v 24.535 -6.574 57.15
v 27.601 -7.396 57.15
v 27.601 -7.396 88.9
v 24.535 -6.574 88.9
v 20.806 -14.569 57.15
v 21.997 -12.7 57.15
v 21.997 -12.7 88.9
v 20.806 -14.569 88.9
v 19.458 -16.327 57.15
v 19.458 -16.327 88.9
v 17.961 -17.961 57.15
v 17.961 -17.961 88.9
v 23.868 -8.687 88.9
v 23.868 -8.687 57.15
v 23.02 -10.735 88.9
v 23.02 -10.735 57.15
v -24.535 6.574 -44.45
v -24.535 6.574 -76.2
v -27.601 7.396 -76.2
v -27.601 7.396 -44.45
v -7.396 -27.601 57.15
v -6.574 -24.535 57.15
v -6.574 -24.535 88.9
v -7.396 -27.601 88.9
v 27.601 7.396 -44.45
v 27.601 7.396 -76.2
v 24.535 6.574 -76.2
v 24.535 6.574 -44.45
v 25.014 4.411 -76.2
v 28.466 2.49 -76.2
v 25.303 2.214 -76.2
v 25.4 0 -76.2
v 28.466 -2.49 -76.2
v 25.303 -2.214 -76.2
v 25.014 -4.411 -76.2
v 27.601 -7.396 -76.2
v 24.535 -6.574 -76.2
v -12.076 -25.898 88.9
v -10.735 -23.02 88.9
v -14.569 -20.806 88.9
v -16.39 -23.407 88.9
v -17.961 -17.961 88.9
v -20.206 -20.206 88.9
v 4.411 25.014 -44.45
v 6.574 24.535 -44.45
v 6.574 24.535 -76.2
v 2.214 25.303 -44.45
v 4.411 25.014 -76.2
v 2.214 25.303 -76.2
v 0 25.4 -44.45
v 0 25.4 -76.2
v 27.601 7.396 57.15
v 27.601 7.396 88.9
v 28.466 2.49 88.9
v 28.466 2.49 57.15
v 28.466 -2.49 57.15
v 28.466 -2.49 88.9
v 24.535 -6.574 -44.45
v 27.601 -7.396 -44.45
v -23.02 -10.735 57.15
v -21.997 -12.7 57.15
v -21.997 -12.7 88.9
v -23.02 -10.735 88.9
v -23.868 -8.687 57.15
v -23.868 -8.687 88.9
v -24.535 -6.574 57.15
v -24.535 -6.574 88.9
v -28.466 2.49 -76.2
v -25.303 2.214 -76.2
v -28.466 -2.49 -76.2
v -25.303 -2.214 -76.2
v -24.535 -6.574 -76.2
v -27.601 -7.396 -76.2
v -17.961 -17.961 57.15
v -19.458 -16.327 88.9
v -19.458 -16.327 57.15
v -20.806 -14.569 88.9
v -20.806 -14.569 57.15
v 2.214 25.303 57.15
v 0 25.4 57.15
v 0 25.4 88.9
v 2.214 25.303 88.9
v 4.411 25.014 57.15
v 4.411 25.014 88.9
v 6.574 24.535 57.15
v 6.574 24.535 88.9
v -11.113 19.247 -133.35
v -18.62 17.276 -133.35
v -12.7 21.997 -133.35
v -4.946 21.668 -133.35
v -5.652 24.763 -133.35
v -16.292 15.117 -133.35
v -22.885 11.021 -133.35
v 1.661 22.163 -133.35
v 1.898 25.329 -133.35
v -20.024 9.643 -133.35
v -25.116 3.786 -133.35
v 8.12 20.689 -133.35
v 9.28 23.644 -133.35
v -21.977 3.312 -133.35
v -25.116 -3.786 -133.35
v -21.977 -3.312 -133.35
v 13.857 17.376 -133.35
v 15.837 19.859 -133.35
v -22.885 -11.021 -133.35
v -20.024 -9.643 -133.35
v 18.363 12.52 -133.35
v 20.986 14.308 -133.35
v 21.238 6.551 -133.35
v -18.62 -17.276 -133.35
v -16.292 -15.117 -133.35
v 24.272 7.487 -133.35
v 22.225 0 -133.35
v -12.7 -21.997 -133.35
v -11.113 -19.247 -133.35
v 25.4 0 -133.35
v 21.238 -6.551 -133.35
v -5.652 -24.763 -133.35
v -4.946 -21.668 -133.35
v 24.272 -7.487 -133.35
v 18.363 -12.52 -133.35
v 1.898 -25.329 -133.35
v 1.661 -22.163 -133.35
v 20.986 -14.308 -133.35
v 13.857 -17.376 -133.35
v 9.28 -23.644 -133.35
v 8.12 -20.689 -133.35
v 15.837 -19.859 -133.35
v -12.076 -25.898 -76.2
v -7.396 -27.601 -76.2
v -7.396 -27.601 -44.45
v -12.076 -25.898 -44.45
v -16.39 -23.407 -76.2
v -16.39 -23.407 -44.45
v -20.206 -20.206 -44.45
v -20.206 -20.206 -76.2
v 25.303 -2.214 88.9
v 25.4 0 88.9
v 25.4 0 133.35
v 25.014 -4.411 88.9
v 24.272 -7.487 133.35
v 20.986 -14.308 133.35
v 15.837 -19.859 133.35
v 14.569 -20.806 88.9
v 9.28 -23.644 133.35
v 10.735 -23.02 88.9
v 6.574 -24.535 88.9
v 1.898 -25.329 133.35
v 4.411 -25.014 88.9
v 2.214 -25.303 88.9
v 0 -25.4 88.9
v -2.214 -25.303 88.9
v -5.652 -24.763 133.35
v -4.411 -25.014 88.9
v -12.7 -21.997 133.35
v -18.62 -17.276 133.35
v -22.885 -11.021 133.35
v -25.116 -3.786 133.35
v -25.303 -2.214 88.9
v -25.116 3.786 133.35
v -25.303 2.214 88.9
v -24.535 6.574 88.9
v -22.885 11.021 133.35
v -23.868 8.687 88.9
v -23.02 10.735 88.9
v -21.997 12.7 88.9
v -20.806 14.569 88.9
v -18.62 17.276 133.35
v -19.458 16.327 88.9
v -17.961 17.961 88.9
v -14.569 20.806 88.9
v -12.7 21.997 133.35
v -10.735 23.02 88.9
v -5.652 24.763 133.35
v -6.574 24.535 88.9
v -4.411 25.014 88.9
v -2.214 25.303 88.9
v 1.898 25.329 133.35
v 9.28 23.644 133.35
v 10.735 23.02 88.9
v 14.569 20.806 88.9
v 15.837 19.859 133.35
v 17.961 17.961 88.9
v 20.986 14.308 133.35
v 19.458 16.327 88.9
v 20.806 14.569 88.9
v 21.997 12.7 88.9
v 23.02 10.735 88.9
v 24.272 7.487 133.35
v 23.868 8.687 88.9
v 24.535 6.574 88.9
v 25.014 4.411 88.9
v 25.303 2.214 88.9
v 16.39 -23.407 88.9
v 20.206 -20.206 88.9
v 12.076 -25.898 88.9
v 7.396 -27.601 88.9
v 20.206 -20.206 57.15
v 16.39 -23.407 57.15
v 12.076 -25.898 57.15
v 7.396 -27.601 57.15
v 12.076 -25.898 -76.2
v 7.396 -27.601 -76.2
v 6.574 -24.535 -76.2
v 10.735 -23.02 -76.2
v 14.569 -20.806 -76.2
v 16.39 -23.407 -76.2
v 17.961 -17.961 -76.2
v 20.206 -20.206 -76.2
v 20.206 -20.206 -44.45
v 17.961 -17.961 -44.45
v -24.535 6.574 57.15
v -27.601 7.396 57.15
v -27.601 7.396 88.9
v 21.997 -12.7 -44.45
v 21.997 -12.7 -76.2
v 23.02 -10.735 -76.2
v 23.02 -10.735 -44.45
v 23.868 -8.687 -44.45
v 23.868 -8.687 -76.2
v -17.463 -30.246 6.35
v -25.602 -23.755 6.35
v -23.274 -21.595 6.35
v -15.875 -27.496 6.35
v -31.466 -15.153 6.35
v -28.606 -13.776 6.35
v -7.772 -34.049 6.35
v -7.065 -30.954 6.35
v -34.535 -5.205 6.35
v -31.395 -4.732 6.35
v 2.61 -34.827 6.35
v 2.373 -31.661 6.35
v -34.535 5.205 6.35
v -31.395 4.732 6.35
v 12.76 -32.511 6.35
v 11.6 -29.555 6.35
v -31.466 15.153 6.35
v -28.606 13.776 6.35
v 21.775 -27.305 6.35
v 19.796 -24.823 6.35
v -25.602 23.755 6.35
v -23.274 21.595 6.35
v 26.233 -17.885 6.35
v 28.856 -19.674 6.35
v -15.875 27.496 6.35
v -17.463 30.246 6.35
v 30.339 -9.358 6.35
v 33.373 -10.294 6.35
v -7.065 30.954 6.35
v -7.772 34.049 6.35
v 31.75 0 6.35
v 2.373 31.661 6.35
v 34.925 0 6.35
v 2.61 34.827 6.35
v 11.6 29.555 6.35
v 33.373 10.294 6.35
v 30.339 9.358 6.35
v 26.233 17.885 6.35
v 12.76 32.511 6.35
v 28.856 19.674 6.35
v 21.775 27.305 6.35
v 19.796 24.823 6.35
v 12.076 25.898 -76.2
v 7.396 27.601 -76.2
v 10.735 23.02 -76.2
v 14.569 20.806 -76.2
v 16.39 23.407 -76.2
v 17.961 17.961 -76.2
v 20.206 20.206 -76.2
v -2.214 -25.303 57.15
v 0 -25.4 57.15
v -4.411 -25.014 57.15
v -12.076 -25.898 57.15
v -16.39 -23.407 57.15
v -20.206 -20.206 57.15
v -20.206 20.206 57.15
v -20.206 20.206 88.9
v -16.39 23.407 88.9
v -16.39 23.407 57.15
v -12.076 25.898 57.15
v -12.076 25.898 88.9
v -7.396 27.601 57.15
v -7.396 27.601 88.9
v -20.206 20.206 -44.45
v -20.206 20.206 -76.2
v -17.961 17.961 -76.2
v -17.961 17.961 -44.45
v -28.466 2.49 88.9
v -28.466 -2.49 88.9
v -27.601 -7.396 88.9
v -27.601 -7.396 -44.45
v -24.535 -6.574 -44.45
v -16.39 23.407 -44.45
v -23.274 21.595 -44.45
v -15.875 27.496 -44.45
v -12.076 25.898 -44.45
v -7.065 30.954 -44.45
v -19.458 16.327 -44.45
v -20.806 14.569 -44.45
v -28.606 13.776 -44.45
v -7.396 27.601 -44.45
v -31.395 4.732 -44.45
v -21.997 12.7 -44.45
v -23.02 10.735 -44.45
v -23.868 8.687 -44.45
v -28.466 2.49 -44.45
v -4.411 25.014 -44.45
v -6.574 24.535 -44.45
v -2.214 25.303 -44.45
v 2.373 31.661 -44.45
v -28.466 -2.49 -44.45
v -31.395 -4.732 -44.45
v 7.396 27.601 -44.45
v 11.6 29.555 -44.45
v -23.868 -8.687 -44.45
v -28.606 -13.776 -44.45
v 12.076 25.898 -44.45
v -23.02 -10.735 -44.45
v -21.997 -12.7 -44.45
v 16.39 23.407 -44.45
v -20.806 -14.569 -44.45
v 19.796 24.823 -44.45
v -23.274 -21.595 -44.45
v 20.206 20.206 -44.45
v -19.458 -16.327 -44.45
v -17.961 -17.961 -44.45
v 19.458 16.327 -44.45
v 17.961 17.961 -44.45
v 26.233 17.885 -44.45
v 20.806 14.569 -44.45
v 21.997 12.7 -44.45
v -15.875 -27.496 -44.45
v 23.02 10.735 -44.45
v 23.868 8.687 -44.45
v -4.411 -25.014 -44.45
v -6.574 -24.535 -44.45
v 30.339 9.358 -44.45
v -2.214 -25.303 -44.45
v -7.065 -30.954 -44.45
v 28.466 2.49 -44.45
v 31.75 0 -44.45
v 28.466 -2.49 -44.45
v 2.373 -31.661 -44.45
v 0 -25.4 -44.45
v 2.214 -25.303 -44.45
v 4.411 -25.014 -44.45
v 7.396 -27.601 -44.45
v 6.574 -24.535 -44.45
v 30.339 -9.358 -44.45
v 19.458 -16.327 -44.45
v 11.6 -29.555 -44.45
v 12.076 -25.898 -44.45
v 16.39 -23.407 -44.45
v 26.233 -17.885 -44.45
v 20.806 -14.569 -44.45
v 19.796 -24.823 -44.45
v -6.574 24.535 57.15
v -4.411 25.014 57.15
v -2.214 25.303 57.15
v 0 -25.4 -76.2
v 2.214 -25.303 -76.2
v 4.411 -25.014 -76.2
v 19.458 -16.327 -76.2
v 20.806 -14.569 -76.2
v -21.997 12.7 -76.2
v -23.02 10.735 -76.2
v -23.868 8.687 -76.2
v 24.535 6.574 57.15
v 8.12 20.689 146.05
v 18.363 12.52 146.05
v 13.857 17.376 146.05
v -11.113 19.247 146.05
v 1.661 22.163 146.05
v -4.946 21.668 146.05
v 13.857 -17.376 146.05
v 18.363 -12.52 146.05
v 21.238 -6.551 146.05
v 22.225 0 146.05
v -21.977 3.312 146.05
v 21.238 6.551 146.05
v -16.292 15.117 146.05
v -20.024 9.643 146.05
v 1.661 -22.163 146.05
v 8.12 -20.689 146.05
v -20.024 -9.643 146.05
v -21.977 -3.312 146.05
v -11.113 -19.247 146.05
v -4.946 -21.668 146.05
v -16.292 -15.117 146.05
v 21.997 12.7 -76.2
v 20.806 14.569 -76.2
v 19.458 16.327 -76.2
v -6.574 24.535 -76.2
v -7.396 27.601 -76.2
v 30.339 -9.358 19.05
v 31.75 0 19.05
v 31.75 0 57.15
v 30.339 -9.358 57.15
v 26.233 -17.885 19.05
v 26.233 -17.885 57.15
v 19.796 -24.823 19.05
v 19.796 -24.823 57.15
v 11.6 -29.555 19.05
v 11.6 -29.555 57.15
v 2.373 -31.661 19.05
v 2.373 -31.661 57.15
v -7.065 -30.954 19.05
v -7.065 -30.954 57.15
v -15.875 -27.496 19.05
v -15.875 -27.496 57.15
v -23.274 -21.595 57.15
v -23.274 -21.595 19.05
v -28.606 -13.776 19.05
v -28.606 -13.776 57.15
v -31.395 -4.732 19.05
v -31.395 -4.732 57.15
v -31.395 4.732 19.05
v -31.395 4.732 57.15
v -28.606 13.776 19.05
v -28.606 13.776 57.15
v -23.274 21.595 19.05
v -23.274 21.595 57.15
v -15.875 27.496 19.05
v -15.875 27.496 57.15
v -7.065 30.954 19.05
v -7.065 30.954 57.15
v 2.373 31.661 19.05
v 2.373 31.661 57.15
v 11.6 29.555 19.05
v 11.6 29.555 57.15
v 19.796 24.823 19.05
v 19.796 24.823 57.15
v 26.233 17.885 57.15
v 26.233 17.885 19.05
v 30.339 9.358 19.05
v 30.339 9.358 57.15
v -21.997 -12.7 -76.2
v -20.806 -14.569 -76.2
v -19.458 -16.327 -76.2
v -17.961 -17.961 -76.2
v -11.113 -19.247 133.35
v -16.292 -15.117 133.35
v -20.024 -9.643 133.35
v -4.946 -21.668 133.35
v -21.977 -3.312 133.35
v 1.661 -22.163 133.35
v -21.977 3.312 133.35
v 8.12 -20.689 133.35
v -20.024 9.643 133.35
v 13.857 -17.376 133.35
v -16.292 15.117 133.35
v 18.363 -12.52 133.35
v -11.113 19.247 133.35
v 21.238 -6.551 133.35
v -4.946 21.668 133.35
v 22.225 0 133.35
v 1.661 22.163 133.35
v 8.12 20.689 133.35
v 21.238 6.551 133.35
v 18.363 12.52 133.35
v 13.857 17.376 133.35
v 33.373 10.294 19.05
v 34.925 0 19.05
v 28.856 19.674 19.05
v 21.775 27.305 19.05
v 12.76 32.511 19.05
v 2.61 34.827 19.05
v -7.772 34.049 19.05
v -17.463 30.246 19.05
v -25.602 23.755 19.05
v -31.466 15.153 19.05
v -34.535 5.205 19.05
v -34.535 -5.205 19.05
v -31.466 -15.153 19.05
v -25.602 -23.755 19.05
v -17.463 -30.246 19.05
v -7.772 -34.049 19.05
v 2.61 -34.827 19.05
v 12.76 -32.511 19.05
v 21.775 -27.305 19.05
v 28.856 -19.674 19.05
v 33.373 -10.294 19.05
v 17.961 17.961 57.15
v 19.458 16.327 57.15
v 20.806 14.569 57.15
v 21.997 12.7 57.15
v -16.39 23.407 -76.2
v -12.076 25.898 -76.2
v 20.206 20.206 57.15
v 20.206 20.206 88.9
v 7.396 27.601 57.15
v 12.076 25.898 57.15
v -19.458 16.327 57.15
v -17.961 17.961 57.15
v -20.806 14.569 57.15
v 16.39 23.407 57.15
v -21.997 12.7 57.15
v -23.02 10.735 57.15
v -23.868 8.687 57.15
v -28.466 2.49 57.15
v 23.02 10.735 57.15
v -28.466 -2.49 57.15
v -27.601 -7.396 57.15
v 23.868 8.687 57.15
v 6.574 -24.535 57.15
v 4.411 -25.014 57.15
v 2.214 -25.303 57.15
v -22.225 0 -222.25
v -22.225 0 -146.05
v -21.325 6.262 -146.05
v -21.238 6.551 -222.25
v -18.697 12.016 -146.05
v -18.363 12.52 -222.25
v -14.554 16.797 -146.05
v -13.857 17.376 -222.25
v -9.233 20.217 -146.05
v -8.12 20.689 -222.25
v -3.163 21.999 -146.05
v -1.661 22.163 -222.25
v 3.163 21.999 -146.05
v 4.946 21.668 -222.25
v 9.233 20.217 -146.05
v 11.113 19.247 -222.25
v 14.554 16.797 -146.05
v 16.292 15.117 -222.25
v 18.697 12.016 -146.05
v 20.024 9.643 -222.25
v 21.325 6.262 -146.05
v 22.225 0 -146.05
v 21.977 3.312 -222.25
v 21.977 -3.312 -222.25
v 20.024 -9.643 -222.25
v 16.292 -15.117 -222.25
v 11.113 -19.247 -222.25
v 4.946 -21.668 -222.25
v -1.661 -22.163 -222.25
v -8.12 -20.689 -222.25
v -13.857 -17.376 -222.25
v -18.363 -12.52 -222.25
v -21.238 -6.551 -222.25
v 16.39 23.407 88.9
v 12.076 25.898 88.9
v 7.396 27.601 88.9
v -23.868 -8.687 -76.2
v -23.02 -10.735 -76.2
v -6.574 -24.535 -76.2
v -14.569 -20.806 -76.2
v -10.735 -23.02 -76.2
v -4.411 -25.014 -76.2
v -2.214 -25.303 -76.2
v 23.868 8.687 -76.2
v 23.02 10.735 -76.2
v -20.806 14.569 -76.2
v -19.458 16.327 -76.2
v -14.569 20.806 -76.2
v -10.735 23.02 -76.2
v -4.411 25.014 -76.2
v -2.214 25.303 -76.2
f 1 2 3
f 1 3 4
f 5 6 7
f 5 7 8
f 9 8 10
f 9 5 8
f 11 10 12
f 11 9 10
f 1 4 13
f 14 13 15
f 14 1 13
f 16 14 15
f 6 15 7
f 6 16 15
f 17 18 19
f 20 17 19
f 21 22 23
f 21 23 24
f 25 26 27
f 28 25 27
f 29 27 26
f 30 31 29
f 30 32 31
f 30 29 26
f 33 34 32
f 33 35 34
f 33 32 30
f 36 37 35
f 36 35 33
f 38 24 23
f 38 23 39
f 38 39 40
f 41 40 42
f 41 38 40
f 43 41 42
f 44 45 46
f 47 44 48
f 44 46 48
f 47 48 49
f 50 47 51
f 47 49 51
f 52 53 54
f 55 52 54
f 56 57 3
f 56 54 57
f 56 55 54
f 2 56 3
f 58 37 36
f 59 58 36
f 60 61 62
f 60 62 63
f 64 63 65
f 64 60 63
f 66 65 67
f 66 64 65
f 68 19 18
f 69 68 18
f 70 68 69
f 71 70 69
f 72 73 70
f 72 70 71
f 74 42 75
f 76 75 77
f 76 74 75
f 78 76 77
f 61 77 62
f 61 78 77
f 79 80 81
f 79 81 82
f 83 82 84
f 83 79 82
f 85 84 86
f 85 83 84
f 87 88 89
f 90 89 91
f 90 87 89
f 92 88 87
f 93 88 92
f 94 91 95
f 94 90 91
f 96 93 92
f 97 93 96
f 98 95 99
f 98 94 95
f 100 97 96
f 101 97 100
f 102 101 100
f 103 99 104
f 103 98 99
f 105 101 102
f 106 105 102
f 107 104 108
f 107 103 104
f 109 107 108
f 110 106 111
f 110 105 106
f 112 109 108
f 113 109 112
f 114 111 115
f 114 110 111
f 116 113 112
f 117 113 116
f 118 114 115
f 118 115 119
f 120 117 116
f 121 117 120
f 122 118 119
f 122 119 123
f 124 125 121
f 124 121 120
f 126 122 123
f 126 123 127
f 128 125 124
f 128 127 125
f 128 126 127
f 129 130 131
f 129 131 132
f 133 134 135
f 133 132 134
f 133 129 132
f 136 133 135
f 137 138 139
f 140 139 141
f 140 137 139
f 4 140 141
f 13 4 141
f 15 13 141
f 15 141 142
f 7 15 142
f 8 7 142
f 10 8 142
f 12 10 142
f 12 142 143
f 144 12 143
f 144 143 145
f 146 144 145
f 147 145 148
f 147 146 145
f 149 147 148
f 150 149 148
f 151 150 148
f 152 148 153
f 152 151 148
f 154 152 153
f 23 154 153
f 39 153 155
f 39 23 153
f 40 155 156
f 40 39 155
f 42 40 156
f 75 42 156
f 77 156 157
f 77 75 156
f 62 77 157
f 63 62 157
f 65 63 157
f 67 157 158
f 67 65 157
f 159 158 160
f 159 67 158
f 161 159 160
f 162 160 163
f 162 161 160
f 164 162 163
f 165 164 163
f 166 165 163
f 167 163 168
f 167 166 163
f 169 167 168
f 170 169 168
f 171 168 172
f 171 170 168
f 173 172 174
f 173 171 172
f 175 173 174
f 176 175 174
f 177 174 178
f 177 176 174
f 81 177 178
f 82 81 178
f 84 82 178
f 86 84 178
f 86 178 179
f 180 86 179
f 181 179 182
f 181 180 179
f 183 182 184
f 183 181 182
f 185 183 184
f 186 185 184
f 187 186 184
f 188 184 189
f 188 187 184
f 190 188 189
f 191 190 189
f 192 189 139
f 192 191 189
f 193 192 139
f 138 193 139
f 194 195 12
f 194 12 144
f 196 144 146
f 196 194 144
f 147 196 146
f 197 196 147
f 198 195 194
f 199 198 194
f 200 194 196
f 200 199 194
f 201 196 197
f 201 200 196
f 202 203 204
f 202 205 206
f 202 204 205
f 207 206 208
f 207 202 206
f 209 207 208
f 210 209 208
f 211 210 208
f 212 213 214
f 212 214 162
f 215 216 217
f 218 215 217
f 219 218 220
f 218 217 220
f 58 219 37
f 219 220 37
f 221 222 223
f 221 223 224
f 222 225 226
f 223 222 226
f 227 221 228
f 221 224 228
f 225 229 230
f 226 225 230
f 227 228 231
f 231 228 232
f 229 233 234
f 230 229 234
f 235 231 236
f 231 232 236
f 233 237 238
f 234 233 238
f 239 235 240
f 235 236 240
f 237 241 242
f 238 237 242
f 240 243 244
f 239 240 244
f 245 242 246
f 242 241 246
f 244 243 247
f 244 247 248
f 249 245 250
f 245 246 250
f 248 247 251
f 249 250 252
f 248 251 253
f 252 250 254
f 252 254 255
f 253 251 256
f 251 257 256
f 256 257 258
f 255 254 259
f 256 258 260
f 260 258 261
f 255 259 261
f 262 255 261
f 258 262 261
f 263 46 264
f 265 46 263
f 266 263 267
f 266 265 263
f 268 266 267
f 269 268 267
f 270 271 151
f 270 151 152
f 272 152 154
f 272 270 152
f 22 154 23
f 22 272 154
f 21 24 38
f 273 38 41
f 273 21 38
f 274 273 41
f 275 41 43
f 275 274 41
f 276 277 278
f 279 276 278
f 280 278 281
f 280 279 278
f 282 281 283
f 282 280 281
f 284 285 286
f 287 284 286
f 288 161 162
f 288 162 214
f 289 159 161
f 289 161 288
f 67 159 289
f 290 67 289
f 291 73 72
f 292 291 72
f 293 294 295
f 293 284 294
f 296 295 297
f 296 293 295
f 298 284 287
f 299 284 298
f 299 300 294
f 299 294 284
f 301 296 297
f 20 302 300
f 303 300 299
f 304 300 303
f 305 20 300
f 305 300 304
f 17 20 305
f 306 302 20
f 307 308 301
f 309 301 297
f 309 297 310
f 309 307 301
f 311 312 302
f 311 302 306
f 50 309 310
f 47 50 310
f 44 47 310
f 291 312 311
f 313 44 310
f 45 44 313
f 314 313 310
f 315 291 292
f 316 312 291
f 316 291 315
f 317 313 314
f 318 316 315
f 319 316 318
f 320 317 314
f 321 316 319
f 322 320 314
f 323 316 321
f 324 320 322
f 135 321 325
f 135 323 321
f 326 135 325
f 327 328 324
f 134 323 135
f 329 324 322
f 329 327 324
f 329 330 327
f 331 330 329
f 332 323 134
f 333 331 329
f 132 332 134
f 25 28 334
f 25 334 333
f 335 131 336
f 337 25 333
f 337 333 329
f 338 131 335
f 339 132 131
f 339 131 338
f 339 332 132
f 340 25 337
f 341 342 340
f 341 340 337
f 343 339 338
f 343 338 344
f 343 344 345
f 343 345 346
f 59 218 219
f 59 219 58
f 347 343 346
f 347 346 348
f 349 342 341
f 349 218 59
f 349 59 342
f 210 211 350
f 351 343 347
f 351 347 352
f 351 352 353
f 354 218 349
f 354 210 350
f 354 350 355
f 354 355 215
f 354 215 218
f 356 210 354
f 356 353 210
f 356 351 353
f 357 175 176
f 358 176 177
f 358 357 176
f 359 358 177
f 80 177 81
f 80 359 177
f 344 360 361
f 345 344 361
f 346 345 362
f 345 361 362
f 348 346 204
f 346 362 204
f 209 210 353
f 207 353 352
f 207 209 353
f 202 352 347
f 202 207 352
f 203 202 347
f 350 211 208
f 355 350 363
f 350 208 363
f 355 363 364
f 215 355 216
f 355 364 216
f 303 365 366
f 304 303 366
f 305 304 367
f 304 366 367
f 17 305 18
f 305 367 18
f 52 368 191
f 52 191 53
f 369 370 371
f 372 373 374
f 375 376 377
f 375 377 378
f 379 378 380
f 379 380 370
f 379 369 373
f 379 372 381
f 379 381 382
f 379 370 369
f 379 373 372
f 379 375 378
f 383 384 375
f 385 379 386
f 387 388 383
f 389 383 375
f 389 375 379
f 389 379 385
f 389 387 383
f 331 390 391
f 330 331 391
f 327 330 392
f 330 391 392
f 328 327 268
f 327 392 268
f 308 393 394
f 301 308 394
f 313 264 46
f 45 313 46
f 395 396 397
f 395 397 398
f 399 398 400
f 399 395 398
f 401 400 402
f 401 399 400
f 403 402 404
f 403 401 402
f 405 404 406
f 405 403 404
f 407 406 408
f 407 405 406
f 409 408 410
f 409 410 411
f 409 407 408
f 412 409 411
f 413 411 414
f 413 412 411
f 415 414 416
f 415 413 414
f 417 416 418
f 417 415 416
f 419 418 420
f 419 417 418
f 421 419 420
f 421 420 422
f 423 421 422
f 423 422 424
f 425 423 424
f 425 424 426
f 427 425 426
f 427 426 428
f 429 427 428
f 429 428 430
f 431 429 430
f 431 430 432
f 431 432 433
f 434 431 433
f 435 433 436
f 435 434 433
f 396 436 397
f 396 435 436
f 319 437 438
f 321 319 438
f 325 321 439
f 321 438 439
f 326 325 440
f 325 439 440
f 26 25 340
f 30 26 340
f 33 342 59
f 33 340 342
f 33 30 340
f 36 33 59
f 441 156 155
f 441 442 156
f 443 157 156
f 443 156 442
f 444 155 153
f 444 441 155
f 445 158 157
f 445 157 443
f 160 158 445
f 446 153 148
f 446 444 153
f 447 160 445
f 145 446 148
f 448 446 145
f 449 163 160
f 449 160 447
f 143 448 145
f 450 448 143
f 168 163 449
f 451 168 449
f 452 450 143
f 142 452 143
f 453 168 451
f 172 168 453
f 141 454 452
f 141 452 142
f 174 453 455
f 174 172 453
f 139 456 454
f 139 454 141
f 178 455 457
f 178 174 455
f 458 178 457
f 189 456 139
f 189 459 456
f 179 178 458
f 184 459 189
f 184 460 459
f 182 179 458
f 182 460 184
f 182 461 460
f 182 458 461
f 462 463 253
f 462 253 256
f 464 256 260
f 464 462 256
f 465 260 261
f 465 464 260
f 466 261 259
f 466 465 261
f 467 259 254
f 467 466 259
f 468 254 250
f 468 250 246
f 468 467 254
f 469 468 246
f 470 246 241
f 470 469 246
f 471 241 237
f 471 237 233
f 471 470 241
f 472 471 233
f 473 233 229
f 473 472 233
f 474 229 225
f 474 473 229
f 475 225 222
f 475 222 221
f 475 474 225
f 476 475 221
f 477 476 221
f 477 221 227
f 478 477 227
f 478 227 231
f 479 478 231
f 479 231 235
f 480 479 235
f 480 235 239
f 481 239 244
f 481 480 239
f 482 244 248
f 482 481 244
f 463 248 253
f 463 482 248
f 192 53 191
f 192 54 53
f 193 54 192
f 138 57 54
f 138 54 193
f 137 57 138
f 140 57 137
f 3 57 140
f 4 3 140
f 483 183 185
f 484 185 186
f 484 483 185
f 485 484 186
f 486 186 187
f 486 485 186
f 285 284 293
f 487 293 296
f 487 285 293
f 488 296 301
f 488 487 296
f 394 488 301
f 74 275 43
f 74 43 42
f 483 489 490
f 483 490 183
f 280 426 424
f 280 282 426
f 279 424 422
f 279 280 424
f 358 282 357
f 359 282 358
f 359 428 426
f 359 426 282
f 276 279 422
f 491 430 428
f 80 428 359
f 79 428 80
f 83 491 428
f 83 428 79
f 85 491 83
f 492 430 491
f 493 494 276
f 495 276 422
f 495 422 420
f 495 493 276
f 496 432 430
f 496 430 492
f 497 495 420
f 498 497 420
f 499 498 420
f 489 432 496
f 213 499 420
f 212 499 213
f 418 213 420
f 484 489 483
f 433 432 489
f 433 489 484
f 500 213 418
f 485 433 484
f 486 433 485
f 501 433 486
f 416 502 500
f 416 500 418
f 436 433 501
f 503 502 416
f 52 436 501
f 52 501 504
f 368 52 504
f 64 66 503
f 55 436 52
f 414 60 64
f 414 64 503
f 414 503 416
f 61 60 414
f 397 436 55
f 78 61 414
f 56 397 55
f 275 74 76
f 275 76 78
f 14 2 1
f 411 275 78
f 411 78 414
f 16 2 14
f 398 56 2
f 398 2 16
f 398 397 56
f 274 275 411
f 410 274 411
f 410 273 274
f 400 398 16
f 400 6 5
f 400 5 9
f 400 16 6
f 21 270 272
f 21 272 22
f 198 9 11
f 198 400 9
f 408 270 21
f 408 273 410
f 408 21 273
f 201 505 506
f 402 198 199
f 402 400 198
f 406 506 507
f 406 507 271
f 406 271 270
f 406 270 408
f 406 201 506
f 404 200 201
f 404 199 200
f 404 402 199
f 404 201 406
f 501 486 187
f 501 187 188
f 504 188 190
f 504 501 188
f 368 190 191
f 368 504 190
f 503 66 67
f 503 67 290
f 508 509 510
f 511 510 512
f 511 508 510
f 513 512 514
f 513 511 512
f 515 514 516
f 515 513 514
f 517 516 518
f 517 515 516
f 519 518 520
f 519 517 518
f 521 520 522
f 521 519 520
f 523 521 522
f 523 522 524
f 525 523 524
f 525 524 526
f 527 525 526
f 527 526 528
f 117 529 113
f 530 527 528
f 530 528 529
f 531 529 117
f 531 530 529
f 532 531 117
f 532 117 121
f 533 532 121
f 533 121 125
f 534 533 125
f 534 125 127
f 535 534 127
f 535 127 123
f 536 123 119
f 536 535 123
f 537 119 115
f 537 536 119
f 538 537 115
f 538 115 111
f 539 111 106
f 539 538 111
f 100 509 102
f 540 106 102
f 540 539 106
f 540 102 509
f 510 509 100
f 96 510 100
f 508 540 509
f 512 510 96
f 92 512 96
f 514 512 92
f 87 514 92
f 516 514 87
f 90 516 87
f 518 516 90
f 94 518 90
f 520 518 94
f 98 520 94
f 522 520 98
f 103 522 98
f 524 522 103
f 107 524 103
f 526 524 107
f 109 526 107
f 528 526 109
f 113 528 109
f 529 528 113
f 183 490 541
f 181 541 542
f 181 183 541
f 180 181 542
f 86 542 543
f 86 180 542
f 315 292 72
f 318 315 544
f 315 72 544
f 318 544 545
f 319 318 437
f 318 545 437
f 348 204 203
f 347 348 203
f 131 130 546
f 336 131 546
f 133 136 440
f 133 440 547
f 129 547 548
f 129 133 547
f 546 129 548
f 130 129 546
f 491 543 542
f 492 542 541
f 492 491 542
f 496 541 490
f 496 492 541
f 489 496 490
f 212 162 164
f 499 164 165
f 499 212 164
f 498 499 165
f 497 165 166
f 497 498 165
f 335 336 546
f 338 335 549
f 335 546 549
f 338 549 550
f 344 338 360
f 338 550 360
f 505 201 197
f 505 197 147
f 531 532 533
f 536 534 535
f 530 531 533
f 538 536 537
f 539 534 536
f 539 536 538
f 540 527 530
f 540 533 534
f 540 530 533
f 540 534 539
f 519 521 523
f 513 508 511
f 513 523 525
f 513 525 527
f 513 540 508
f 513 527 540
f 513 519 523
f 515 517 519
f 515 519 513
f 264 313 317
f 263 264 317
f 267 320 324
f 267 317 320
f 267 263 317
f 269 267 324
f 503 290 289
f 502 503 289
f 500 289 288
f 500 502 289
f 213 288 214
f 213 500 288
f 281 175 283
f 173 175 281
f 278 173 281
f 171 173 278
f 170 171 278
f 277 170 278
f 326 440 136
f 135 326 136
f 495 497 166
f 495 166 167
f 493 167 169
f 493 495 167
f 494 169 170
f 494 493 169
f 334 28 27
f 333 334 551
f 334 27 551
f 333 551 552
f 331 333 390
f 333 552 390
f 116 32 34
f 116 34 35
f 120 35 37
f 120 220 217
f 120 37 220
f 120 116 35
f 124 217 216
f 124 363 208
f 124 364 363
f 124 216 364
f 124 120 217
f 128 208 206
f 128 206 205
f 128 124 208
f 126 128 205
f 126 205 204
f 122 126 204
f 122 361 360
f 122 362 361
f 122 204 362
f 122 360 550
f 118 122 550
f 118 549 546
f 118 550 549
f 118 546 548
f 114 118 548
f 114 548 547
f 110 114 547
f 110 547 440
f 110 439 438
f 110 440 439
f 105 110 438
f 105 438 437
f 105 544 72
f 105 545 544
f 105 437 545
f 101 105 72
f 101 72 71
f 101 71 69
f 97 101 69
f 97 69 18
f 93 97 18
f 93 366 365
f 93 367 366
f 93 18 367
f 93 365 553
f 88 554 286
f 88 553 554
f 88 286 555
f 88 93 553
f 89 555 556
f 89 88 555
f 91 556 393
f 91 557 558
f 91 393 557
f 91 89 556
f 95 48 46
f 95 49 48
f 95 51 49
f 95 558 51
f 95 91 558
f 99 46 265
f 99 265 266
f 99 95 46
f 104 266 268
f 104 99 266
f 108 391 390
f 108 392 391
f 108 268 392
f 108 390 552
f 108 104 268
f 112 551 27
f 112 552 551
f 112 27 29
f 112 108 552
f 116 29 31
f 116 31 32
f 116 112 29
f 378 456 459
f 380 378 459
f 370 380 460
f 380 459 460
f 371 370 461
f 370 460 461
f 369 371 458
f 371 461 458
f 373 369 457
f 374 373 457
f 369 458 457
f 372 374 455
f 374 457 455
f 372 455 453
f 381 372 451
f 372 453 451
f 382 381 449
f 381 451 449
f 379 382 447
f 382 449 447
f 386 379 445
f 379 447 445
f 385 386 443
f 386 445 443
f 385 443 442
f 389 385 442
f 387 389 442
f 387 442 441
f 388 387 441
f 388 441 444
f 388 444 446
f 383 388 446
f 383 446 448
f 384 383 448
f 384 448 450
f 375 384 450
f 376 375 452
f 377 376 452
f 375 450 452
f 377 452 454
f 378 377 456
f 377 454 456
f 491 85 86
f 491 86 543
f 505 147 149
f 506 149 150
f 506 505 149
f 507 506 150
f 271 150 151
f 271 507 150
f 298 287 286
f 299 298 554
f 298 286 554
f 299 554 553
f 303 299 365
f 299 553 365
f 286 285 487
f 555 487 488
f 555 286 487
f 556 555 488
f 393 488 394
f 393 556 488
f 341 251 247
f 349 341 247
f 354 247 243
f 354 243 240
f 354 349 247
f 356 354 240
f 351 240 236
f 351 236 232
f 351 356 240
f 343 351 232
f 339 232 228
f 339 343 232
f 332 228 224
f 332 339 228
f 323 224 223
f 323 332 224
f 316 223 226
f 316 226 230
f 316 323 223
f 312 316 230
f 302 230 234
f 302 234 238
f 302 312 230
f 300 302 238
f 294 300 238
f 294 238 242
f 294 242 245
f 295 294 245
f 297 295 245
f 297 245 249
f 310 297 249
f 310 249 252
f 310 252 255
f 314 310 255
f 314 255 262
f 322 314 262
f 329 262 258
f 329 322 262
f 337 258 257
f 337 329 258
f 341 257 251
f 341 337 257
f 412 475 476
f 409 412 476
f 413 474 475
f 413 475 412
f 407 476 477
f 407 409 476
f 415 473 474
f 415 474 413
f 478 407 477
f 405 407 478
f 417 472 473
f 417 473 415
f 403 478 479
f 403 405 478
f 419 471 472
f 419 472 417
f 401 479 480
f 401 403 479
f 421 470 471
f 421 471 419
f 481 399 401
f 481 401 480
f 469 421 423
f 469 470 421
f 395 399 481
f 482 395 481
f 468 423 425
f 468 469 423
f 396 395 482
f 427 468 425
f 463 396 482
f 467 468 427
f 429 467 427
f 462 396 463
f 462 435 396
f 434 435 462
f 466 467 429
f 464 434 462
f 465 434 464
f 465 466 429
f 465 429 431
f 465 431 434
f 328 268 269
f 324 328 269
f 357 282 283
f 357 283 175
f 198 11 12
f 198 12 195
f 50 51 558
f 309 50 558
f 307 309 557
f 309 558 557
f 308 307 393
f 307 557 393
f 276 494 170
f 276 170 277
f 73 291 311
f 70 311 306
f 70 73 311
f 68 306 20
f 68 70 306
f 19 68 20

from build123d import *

# Parameters (mm, degrees)
CUT_EXTRUDE2_START  = -31.75
CUT_EXTRUDE2_DEPTH  = 31.75
CIRPATTERN1_COUNT   = 6
CUT_EXTRUDE3_DEPTH  = 31.75
CIRPATTERN2_COUNT   = 6
CUT_EXTRUDE4_START  = -12.7
SKETCH7_R           = 25.4
SKETCH7_R_2         = 22.225
CUT_EXTRUDE4_DEPTH  = 12.7
SKETCH8_R           = 25.4
SKETCH8_R_2         = 22.225
CUT_EXTRUDE5_DEPTH  = 12.7
BOSS_EXTRUDE1_START = -38.1
SKETCH9_R           = 34.925
BOSS_EXTRUDE1_DEPTH = 12.7
BOSS_EXTRUDE2_START = 76.2
SKETCH10_R          = 22.225
BOSS_EXTRUDE2_DEPTH = 76.2


with BuildPart() as part:
    # Sketch3 → Revolve1 (revolve)
    with BuildSketch(Plane(origin=(0, 0, 0), x_dir=(0, 0, -1), z_dir=(1, 0, 0)), mode=Mode.PRIVATE) as revolve1_sk:
        Polygon((-146.05, 0), (-146.05, 25.4), (-88.9, 25.4), (-88.9, 28.575), (-57.15, 28.575), (-57.15, 31.75), (44.45, 31.75), (44.45, 28.575), (76.2, 28.575), (76.2, 25.4), (146.05, 25.4), (146.05, 0), align=None)
    revolve(revolve1_sk.sketch.rotate(Axis((0, 0, 128.279136691), (0, 0, -1)), 90), axis=Axis((0, 0, 128.279136691), (0, 0, -1)))

    # Sketch5 → Cut-Extrude2 (cut)
    with BuildSketch(Plane.XY.offset(88.9).offset(CUT_EXTRUDE2_START)):
        with BuildLine():
            Line((0, 28.575), (0, 25.4))
            ThreePointArc((0, 25.4), (3.315365282, 25.182699479), (6.574003746, 24.534515988))
            Line((6.574003746, 24.534515988), (7.395754214, 27.601330486))
            ThreePointArc((7.395754214, 27.601330486), (3.729785943, 28.330536914), (0, 28.575))
        make_face()
        with BuildLine():
            ThreePointArc((-6.574003746, 24.534515988), (-3.315365282, 25.182699479), (0, 25.4))
            Line((0, 25.4), (0, 28.575))
            ThreePointArc((0, 28.575), (-3.729785943, 28.330536914), (-7.395754214, 27.601330486))
            Line((-7.395754214, 27.601330486), (-6.574003746, 24.534515988))
        make_face()
    cut_extrude2 = extrude(amount=CUT_EXTRUDE2_DEPTH, mode=Mode.SUBTRACT)

    # CirPattern1: Cut-Extrude2 ×6 about axis
    cirpattern1_axis = Axis((0, 0, 0), (0, 0, 1))
    for i in range(1, CIRPATTERN1_COUNT):
        add(cut_extrude2.rotate(cirpattern1_axis, i * 360 / CIRPATTERN1_COUNT), mode=Mode.SUBTRACT)

    # Sketch6 → Cut-Extrude3 (cut)
    with BuildSketch(Plane(origin=(0, 0, -76.2), x_dir=(-1, 0, 0), z_dir=(0, 0, -1))):
        with BuildLine():
            Line((0, 28.575), (0, 25.4))
            ThreePointArc((0, 25.4), (3.315365282, 25.182699479), (6.574003746, 24.534515988))
            Line((6.574003746, 24.534515988), (7.395754214, 27.601330486))
            ThreePointArc((7.395754214, 27.601330486), (3.729785943, 28.330536914), (0, 28.575))
        make_face()
        with BuildLine():
            ThreePointArc((-6.574003746, 24.534515988), (-3.315365282, 25.182699479), (0, 25.4))
            Line((0, 25.4), (0, 28.575))
            ThreePointArc((0, 28.575), (-3.729785943, 28.330536914), (-7.395754214, 27.601330486))
            Line((-7.395754214, 27.601330486), (-6.574003746, 24.534515988))
        make_face()
    cut_extrude3 = extrude(amount=-CUT_EXTRUDE3_DEPTH, mode=Mode.SUBTRACT)

    # CirPattern2: Cut-Extrude3 ×6 about axis
    cirpattern2_axis = Axis((0, 0, 0), (0, 0, 1))
    for i in range(1, CIRPATTERN2_COUNT):
        add(cut_extrude3.rotate(cirpattern2_axis, i * 360 / CIRPATTERN2_COUNT), mode=Mode.SUBTRACT)

    # Sketch7 → Cut-Extrude4 (cut)
    with BuildSketch(Plane.XY.offset(146.05).offset(CUT_EXTRUDE4_START)):
        Circle(SKETCH7_R)
        Circle(SKETCH7_R_2, mode=Mode.SUBTRACT)
    extrude(amount=CUT_EXTRUDE4_DEPTH, mode=Mode.SUBTRACT)

    # Sketch8 → Cut-Extrude5 (cut)
    with BuildSketch(Plane(origin=(0, 0, -146.05), x_dir=(-1, 0, 0), z_dir=(0, 0, -1))):
        with Locations(Location((0, 0, 0), (0, 0, 195))):
            Circle(SKETCH8_R)
        with Locations(Location((0, 0, 0), (0, 0, 180))):
            Circle(SKETCH8_R_2, mode=Mode.SUBTRACT)
    extrude(amount=-CUT_EXTRUDE5_DEPTH, mode=Mode.SUBTRACT)

    # Sketch9 → Boss-Extrude1 (add)
    with BuildSketch(Plane.XY.offset(57.15).offset(BOSS_EXTRUDE1_START)):
        Circle(SKETCH9_R)
    extrude(amount=-BOSS_EXTRUDE1_DEPTH)

    # Sketch10 → Boss-Extrude2 (add)
    with BuildSketch(Plane(origin=(0, 0, -146.05), x_dir=(-1, 0, 0), z_dir=(0, 0, -1)).offset(BOSS_EXTRUDE2_START)):
        Circle(SKETCH10_R)
    extrude(amount=-BOSS_EXTRUDE2_DEPTH)


solid = part.part
